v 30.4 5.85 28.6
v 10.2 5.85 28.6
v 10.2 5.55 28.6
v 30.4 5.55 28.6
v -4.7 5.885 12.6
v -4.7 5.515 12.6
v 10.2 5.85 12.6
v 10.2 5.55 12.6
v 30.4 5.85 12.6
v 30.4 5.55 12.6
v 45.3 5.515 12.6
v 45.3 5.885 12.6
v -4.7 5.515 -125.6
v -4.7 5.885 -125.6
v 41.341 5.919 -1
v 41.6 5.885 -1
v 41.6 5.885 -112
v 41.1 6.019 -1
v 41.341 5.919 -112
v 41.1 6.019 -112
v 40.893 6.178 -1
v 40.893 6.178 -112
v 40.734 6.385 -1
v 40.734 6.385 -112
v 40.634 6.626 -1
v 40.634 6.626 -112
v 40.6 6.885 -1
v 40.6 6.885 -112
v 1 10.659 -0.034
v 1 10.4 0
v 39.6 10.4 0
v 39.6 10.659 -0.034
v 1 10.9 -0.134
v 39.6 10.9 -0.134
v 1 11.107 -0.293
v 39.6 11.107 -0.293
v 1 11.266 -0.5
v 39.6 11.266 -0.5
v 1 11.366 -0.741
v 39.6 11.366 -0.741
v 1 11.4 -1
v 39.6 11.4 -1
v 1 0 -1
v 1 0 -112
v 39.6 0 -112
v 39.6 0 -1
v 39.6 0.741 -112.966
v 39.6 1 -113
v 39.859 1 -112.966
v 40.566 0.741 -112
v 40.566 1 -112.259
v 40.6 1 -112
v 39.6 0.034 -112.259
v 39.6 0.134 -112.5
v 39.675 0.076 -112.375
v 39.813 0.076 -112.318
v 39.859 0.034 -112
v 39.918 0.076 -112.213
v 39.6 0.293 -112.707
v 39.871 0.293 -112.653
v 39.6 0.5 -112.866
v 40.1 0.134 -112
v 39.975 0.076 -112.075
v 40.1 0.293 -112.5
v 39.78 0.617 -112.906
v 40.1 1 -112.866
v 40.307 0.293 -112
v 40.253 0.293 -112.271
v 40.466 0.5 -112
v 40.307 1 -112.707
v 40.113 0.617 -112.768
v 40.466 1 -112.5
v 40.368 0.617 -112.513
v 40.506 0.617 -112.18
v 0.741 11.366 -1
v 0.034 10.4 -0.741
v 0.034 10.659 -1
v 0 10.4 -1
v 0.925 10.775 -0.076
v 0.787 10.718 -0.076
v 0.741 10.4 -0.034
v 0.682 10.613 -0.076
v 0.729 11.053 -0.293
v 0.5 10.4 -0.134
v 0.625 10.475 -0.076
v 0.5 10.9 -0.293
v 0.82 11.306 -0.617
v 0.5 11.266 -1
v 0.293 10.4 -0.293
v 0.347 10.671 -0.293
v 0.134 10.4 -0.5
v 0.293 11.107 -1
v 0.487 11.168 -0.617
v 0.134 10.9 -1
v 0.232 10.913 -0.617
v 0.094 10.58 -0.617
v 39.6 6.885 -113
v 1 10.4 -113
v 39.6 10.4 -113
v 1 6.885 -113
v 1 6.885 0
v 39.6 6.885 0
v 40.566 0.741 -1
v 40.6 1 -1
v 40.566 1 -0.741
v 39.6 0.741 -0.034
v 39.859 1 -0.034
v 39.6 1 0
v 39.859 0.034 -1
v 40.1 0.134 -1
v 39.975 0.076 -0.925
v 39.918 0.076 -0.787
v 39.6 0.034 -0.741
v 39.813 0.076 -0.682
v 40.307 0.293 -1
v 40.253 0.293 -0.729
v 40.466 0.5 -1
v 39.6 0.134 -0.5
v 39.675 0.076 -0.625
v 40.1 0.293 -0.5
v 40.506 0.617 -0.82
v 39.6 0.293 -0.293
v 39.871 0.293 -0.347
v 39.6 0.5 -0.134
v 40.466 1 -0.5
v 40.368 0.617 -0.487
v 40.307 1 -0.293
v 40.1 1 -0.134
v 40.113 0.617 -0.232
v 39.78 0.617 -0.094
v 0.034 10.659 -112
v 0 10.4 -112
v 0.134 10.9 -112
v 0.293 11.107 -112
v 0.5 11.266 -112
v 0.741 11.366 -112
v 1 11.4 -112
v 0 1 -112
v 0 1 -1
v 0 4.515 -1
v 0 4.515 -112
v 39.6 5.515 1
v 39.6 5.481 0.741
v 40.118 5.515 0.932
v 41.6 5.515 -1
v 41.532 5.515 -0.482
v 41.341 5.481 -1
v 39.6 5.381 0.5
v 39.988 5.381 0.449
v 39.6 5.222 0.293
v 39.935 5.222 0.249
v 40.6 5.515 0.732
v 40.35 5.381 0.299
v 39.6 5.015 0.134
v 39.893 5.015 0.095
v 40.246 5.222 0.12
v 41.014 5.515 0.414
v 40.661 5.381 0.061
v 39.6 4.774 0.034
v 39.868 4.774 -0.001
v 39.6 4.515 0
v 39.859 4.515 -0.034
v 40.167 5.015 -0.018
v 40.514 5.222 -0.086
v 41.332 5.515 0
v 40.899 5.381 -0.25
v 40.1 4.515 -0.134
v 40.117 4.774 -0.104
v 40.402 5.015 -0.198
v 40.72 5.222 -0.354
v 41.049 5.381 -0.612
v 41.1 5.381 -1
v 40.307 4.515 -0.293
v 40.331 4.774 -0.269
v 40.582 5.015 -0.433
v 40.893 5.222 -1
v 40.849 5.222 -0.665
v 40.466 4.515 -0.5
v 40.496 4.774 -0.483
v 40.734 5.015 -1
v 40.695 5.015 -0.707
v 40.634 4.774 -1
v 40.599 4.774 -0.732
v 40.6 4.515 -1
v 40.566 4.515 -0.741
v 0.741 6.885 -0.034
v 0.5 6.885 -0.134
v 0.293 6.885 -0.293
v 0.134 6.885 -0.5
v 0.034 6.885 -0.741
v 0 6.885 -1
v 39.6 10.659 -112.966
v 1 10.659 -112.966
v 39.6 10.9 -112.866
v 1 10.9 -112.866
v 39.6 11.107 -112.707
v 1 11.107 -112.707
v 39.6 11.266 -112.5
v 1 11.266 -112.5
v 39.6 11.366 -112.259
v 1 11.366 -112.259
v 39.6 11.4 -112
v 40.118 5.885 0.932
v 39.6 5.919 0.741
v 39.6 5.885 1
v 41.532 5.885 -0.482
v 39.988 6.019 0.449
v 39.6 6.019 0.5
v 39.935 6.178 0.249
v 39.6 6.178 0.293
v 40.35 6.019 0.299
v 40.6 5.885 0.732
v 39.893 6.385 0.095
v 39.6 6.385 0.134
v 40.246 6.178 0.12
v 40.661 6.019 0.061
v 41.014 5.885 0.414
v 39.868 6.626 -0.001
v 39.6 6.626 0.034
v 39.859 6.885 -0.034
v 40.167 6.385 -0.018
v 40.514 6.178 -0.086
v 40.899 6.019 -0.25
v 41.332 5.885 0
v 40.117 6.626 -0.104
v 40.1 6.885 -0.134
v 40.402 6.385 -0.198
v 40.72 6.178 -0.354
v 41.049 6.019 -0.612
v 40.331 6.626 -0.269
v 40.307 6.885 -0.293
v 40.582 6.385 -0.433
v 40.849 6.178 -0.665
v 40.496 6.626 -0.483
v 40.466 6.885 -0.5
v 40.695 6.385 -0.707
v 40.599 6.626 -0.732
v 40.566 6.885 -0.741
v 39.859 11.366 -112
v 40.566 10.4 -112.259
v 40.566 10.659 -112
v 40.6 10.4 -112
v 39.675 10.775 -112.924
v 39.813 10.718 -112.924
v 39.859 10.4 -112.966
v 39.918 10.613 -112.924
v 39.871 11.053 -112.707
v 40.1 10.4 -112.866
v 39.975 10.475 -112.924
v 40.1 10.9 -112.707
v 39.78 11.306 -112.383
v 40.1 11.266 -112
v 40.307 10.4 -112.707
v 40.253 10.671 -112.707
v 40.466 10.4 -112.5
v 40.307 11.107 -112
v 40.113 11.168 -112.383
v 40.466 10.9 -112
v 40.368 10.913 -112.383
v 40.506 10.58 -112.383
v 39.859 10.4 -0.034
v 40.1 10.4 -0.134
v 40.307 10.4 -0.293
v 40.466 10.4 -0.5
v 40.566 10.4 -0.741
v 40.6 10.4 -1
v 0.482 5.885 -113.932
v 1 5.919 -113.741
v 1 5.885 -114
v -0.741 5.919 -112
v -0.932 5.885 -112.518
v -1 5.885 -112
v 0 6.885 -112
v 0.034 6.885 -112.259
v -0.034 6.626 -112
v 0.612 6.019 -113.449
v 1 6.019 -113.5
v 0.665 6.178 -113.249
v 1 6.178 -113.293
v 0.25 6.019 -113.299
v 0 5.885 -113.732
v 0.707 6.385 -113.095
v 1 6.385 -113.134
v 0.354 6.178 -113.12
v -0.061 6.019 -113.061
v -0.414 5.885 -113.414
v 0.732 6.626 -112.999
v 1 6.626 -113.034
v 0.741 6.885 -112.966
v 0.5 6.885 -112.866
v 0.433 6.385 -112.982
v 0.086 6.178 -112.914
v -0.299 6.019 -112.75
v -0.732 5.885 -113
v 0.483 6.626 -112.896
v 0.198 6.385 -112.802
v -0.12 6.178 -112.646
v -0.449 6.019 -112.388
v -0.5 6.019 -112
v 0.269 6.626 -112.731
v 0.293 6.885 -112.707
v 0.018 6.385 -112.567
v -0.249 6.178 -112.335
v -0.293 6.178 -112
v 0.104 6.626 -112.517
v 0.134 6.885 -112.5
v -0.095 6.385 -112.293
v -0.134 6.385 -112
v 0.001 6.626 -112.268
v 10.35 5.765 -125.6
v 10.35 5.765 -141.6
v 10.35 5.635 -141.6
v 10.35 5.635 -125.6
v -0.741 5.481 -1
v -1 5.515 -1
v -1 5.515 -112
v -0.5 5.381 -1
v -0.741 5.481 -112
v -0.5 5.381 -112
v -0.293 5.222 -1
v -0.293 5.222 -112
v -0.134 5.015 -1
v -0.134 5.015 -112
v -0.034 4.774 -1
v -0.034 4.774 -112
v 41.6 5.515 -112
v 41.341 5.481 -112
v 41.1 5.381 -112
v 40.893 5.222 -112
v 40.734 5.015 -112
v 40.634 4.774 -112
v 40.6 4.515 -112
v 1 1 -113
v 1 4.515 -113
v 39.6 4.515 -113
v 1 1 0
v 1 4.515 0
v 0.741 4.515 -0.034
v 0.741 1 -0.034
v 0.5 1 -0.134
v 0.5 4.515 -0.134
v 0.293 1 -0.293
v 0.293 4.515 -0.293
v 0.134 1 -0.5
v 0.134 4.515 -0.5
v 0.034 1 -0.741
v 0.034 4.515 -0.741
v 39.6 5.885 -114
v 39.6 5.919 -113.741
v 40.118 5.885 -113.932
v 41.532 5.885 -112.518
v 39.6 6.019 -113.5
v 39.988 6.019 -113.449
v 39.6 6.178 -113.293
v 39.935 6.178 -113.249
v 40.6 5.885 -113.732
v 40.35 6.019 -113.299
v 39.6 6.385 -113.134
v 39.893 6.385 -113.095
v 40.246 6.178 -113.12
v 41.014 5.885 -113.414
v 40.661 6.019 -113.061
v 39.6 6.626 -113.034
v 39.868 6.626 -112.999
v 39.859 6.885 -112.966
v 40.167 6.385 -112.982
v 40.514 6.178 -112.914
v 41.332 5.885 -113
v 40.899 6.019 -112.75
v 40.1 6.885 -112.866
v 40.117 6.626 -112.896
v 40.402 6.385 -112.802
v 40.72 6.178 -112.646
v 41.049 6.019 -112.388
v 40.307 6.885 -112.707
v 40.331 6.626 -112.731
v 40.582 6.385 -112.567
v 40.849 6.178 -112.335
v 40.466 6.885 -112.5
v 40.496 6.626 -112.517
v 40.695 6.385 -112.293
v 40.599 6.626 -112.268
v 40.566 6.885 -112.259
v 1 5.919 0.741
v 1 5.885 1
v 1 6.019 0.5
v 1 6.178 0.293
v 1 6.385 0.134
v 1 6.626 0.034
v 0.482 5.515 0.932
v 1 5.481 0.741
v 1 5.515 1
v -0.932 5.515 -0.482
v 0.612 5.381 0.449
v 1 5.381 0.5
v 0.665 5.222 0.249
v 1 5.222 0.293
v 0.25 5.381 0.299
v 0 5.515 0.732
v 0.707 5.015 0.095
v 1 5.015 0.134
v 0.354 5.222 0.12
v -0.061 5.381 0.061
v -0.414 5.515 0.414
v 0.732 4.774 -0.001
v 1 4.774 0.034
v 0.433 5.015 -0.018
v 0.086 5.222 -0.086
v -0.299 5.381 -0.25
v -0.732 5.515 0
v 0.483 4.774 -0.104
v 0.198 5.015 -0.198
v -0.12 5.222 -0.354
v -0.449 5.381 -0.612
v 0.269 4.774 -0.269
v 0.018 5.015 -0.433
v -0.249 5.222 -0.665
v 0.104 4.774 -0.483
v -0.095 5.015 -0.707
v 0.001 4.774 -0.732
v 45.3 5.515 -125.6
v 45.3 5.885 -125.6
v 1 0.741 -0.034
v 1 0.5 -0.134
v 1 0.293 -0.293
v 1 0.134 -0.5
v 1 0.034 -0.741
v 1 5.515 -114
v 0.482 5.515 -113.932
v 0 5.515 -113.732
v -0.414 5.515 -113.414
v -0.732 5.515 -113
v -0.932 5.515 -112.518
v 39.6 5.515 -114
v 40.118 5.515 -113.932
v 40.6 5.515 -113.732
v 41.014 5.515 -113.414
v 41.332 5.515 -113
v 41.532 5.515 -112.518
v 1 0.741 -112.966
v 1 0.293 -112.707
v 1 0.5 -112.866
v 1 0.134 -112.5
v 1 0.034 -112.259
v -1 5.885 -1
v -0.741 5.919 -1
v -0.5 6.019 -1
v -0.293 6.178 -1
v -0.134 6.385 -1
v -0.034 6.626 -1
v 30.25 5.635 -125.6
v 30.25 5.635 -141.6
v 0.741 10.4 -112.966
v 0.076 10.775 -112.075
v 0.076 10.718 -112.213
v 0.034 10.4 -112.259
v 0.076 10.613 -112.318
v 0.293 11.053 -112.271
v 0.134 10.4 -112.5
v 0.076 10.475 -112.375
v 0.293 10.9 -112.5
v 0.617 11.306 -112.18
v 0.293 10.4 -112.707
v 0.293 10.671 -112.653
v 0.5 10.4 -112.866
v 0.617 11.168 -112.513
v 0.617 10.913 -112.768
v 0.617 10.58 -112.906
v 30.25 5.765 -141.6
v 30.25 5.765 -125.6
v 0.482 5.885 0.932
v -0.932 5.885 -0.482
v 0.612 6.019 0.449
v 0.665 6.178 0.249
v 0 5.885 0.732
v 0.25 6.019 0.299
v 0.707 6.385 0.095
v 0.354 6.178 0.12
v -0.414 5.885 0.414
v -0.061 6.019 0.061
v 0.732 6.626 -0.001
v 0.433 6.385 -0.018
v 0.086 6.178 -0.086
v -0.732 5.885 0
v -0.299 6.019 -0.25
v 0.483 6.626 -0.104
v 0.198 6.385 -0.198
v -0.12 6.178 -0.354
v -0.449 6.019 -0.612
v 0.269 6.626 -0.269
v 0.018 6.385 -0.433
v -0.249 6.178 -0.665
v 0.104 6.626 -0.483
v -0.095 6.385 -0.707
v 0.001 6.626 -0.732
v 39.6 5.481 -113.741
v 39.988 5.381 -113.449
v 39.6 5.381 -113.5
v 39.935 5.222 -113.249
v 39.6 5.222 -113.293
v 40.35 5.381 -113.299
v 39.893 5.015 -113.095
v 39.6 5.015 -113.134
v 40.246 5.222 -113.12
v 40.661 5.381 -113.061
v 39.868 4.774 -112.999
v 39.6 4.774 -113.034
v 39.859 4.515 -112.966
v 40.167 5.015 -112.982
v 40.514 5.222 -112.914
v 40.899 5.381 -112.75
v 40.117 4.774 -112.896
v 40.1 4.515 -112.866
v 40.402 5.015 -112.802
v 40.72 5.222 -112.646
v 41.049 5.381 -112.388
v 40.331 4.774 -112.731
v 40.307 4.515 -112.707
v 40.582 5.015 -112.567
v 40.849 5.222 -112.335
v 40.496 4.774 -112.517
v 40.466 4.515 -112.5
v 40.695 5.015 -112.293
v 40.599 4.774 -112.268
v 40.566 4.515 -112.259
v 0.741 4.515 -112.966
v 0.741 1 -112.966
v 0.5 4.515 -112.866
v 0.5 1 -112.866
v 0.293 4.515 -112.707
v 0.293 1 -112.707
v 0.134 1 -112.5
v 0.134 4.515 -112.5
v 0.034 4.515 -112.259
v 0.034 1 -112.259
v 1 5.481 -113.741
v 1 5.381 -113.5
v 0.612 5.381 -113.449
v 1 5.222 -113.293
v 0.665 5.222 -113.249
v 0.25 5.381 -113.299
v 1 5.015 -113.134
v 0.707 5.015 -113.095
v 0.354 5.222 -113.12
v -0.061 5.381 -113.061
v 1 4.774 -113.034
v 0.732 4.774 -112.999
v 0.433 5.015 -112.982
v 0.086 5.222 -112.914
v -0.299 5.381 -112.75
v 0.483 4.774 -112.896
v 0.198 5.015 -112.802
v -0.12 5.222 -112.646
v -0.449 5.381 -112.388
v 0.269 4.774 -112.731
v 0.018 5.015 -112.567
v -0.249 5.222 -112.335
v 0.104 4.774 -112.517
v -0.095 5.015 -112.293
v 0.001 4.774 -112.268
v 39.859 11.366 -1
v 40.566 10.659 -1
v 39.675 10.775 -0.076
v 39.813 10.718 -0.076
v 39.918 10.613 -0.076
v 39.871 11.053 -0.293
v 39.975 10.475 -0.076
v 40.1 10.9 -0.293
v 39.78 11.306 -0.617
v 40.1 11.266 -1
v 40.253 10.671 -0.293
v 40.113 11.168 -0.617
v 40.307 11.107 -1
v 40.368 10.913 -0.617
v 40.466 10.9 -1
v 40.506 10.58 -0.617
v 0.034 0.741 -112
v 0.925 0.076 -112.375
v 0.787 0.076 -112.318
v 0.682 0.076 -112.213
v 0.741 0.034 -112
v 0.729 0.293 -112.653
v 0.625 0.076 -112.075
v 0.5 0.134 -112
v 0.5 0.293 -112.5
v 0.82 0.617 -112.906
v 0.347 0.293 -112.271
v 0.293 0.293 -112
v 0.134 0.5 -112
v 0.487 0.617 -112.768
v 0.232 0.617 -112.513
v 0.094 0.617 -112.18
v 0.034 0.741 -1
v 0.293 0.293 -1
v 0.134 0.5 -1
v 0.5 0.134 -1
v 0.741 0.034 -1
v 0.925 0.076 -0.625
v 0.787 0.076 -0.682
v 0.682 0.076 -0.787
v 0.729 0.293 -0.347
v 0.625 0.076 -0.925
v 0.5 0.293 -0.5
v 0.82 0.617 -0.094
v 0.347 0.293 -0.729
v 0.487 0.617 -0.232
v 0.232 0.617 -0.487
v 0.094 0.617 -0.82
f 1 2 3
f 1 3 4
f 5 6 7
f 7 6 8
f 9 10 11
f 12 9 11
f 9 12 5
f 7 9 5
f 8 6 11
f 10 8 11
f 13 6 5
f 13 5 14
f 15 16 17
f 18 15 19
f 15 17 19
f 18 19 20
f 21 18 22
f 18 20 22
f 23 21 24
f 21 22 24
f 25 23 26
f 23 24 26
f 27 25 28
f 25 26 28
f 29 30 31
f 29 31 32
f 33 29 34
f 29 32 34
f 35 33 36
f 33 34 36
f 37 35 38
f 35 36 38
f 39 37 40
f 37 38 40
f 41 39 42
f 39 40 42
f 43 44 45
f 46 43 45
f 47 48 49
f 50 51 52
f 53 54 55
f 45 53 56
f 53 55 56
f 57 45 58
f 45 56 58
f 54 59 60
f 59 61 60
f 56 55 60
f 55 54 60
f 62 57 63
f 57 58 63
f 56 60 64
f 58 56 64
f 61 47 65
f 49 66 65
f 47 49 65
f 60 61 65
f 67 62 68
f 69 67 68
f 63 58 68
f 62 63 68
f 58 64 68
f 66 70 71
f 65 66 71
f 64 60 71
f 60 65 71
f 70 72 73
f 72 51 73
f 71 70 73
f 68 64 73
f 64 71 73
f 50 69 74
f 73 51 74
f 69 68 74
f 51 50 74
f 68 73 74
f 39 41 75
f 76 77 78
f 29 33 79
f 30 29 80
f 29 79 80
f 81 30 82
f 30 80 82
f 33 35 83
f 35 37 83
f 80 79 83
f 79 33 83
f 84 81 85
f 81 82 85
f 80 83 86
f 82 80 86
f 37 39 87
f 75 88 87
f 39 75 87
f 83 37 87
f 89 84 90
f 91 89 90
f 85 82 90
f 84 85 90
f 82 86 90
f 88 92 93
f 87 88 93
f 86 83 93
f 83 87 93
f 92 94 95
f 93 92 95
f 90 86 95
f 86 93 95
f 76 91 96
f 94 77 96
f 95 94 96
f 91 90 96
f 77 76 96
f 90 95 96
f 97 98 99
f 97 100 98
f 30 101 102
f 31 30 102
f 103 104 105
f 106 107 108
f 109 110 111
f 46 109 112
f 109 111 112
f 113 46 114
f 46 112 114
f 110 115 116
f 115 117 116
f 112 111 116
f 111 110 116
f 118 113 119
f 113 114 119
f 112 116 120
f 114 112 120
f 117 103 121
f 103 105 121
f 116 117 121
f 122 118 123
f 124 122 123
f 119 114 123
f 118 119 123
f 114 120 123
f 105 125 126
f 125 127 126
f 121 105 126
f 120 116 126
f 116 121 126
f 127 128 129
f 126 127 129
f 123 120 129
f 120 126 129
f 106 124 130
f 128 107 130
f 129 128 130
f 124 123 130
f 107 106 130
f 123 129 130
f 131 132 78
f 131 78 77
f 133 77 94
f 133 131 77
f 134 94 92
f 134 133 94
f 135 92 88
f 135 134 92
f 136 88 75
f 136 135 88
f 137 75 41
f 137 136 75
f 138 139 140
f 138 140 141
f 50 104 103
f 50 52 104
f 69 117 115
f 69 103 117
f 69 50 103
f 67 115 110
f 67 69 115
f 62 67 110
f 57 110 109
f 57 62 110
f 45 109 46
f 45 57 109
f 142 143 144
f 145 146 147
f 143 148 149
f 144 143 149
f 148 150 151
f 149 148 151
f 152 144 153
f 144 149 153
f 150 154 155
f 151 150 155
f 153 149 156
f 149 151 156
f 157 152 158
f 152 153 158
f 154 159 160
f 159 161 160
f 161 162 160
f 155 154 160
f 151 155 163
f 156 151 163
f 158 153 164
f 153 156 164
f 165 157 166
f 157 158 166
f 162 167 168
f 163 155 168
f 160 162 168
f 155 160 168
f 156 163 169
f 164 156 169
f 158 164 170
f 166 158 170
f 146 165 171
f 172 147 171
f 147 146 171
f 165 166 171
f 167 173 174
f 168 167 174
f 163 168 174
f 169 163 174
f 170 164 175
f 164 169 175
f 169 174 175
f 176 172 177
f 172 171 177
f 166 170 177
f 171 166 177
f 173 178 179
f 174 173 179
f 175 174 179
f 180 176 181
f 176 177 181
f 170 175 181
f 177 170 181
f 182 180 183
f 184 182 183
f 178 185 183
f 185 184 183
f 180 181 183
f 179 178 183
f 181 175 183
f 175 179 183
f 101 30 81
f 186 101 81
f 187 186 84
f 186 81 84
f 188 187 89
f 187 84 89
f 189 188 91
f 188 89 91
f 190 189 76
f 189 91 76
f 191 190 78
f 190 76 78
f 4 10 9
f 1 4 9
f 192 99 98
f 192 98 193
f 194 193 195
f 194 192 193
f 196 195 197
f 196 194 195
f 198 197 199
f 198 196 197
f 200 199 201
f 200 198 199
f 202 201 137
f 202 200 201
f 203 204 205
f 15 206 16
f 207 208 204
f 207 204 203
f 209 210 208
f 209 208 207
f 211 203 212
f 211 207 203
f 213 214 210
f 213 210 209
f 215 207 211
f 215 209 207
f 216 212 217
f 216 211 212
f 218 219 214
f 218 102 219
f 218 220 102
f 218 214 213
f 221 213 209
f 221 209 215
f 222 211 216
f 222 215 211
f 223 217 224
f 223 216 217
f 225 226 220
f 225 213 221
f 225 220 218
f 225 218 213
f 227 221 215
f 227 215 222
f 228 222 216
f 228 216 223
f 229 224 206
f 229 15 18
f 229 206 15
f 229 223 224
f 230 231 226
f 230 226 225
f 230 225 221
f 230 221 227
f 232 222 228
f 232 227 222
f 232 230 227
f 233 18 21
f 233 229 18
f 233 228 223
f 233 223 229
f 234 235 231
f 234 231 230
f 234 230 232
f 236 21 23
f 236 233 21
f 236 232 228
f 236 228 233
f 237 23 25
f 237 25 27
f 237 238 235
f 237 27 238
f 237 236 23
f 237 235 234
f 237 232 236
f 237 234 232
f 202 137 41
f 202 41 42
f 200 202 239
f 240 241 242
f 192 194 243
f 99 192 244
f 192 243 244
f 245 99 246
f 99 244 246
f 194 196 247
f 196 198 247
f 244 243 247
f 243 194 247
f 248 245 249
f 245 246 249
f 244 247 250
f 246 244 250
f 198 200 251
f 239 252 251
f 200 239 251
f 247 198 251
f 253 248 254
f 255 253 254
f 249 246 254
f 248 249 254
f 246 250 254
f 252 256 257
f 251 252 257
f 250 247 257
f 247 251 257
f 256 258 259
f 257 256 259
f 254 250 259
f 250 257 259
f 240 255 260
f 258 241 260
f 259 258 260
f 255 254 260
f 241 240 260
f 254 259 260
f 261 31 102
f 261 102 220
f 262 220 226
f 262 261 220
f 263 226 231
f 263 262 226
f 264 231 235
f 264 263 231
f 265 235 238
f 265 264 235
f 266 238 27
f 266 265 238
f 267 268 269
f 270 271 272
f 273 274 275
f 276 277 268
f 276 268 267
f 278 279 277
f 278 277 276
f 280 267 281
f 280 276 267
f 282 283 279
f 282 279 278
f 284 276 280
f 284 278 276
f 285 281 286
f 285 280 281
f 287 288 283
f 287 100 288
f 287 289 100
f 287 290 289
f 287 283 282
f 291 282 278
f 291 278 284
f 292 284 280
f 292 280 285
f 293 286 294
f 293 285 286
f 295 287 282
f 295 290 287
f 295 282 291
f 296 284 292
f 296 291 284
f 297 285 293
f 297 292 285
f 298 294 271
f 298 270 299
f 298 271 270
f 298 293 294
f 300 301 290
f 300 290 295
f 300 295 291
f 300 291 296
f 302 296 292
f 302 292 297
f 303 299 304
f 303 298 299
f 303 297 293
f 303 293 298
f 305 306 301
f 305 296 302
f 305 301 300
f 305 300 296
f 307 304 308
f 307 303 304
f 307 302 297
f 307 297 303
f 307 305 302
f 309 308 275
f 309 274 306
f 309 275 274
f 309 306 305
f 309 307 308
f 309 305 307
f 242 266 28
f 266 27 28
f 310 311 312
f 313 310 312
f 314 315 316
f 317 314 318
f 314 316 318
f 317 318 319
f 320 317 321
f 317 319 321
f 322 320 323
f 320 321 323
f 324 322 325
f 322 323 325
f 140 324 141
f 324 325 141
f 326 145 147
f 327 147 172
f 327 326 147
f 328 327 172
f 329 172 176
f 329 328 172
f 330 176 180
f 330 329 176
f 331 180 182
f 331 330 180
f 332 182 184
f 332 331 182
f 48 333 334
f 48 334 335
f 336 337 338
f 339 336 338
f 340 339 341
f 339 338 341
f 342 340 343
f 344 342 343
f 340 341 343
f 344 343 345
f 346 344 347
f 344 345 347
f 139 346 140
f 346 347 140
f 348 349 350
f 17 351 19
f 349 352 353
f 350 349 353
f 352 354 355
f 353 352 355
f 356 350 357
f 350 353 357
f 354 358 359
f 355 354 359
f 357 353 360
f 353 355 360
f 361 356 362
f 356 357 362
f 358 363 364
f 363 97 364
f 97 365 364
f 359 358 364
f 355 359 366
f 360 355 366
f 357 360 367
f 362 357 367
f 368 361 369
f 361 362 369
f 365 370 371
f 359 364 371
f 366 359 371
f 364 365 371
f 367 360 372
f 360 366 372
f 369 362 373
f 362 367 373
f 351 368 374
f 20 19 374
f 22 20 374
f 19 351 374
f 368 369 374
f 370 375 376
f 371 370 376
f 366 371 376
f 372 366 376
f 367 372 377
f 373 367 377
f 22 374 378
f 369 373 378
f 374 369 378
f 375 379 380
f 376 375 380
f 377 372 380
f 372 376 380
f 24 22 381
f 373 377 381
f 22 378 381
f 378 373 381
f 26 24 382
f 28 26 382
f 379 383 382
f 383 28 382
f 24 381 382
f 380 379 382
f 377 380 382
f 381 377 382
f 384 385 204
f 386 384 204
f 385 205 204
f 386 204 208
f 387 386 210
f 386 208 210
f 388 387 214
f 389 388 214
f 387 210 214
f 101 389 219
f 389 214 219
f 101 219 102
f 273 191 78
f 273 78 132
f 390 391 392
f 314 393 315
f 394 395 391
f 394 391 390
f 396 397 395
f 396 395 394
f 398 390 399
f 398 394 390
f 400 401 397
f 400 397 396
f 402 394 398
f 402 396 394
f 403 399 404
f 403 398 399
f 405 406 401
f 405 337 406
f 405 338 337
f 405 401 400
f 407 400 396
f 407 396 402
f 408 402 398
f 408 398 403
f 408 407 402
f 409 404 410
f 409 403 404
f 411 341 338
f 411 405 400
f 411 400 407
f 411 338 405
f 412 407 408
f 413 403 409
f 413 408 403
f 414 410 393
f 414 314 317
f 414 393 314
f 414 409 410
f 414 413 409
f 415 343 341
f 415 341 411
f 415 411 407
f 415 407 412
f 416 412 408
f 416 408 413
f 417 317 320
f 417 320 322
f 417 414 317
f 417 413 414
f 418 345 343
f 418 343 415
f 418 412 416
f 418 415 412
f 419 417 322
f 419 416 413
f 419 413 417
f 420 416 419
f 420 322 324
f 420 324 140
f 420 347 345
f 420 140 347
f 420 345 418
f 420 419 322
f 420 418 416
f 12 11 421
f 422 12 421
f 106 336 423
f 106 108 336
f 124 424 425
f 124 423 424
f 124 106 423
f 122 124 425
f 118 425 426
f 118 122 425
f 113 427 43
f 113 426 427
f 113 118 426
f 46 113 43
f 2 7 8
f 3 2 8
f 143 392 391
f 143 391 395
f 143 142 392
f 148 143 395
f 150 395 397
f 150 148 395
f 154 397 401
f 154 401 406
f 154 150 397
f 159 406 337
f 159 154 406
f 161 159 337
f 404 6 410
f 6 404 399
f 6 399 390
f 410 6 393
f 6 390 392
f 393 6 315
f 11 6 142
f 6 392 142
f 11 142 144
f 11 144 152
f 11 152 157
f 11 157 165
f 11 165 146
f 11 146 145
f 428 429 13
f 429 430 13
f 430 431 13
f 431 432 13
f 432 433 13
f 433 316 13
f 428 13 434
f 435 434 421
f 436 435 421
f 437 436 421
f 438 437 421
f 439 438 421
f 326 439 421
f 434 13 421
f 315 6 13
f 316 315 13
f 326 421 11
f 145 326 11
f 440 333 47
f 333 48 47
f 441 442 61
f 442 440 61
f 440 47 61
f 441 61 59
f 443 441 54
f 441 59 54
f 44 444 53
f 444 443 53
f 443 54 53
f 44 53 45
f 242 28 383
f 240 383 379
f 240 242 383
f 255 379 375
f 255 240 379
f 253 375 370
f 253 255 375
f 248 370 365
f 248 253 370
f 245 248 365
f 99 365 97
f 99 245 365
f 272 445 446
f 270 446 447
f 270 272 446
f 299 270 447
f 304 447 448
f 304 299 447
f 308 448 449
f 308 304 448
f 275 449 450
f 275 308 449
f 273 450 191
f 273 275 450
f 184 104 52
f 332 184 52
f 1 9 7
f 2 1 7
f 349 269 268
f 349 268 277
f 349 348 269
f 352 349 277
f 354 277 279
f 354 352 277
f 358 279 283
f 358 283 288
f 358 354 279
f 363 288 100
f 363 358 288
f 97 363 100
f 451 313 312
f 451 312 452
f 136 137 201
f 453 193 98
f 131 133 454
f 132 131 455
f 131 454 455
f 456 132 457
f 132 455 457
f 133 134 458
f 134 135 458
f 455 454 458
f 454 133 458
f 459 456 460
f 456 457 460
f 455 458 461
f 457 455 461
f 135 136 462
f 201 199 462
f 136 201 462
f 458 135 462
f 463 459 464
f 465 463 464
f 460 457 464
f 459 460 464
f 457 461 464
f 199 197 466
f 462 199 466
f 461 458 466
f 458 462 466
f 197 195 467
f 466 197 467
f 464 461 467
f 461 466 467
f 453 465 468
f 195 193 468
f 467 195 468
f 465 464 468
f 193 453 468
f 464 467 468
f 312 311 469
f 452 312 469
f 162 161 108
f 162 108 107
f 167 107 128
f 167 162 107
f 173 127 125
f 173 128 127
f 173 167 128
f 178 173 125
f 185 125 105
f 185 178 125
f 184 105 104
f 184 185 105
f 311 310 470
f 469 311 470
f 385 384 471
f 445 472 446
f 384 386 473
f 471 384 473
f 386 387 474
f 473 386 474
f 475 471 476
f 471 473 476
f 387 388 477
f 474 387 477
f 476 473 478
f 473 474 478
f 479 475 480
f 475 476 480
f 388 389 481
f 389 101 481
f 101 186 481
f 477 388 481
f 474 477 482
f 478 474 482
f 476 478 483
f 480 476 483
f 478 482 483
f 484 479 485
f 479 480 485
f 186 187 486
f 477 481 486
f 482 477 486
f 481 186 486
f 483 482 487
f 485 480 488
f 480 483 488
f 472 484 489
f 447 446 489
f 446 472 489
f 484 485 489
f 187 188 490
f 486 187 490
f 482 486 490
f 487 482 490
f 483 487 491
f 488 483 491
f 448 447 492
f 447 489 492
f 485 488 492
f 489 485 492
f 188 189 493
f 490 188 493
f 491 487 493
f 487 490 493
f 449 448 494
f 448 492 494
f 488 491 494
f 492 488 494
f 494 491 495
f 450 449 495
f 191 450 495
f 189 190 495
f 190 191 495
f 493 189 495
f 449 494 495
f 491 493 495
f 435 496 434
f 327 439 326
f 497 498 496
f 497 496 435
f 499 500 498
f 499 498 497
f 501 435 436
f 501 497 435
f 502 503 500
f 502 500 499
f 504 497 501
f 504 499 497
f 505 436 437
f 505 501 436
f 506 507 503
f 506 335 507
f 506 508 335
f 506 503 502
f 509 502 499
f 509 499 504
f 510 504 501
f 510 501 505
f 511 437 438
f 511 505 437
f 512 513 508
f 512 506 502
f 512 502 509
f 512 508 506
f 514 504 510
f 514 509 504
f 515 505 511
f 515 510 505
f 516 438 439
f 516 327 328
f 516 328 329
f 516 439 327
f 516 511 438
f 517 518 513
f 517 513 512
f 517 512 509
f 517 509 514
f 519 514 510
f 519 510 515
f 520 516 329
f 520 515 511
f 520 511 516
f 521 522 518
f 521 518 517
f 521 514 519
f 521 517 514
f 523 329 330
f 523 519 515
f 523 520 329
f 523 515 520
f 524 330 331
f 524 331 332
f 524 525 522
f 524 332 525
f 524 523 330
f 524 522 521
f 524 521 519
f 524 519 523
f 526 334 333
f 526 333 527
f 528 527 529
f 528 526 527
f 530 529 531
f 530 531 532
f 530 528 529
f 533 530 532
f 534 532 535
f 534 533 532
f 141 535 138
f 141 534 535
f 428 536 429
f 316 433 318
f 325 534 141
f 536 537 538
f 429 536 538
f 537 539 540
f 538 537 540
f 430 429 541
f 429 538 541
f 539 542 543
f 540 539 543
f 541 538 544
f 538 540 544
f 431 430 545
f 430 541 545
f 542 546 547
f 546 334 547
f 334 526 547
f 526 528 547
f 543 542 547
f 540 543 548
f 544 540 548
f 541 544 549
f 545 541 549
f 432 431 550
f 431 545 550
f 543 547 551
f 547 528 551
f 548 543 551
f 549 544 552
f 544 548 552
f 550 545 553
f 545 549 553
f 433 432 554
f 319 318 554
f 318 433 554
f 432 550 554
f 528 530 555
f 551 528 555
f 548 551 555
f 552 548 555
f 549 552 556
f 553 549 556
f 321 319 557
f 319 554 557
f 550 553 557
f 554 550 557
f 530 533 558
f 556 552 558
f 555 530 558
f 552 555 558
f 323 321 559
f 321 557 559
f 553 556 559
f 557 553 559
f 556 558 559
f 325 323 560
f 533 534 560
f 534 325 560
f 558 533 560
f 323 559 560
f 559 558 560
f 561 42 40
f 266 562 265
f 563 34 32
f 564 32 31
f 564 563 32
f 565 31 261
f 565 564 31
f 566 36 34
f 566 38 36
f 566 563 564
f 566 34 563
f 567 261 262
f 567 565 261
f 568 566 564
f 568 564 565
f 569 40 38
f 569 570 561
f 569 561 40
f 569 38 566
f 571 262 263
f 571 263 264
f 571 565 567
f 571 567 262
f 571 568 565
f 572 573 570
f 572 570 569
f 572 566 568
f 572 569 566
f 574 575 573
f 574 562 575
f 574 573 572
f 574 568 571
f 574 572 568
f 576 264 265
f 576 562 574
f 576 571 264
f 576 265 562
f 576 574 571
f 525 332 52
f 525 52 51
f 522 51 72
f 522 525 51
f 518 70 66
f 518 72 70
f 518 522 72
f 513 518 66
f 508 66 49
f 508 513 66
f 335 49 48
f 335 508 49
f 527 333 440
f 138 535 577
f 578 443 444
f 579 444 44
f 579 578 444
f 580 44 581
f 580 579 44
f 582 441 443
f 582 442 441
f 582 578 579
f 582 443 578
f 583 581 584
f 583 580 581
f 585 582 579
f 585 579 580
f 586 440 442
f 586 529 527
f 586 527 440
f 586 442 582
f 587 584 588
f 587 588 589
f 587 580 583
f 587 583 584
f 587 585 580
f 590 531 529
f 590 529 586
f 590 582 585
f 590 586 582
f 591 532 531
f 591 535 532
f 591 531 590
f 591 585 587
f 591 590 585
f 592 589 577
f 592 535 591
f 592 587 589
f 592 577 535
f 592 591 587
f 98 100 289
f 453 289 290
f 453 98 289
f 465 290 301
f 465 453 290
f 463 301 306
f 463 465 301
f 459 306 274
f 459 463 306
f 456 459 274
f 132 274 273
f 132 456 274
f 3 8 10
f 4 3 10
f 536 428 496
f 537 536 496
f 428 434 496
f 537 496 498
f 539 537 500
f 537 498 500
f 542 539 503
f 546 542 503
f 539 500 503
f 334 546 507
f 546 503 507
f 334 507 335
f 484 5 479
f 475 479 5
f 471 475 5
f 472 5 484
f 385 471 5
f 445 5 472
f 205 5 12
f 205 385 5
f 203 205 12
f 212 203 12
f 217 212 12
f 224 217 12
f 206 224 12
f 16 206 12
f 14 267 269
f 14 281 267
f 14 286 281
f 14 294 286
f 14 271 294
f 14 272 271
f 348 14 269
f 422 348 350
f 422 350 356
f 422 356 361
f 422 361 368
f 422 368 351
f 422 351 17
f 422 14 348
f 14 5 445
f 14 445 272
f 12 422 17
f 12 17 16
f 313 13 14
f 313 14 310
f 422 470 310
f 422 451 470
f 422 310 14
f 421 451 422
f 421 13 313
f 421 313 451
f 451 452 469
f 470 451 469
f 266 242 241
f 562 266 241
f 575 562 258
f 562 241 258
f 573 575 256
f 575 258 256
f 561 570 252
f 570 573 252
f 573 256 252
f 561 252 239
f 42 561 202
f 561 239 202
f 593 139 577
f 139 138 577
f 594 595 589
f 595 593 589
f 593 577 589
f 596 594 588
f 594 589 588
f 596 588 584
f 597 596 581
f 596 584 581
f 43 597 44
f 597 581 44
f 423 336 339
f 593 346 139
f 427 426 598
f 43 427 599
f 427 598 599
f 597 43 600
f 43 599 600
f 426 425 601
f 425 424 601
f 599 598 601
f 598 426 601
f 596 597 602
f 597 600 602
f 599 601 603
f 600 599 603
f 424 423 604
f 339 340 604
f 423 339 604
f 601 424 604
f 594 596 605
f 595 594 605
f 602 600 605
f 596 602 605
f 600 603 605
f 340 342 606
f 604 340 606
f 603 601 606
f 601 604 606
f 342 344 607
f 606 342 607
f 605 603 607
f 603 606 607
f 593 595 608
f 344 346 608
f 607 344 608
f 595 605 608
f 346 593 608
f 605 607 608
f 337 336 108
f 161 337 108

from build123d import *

# Parameters (mm, degrees)
SKETCH1_W                = 40.6
SKETCH1_H                = 113
BOSS_EXTRUDE2_DEPTH      = 11.4
SKETCH3_W                = 4.7
SKETCH3_H                = 0.01
BOSS_EXTRUDE3_DEPTH      = 1
BOSS_EXTRUDE4_DEPTH      = 0.185
BOSS_EXTRUDE4_DEPTH_BACK = 0.185
SKETCH4_W                = 50
SKETCH4_H                = 138.2
BOSS_EXTRUDE5_DEPTH      = 16
BOSS_EXTRUDE6_DEPTH      = 16
FILLET1_R                = 1


with BuildPart() as part:
    # Sketch1 → Boss-Extrude2 (new body)
    with BuildSketch(Plane(origin=(0, 0, 0), x_dir=(1, 0, 0), z_dir=(0, 1, 0))):
        with Locations((20.3, 56.5)):
            Rectangle(SKETCH1_W, SKETCH1_H)
    extrude(amount=BOSS_EXTRUDE2_DEPTH)



with BuildPart() as body_2:
    # Sketch3 → Boss-Extrude3 (new body)
    with BuildSketch(Plane.XY):
        with Locations((-2.35, 5.695)):
            Rectangle(SKETCH3_W, SKETCH3_H)
    extrude(amount=BOSS_EXTRUDE3_DEPTH)


with BuildPart() as part_1:
    add(part.part)

    add(body_2.part)  # Boss-Extrude4 merges body 2
    # Sketch4 → Boss-Extrude4 (add, two sides: drawn at the far end of the back side and taken through both)
    with BuildSketch(Plane(origin=(0, 5.7, 0), x_dir=(1, 0, 0), z_dir=(0, 1, 0)).offset(-BOSS_EXTRUDE4_DEPTH_BACK)):
        with Locations((20.3, 56.5)):
            Rectangle(SKETCH4_W, SKETCH4_H)
    extrude(amount=BOSS_EXTRUDE4_DEPTH + BOSS_EXTRUDE4_DEPTH_BACK)

    # Sketch5 → Boss-Extrude5 (add)
    with BuildSketch(Plane.XY.offset(12.6)):
        Polygon((30.4, 5.85), (20.3, 5.85), (10.2, 5.85), (10.2, 5.549950483), (30.4, 5.549950483), align=None)
    extrude(amount=BOSS_EXTRUDE5_DEPTH)

    # Sketch6 → Boss-Extrude6 (add)
    with BuildSketch(Plane(origin=(0, 0, -125.6), x_dir=(-1, 0, 0), z_dir=(0, 0, -1))):
        Polygon((-20.3, 5.765), (-10.35, 5.765), (-10.35, 5.635), (-30.25, 5.635), (-30.25, 5.765), align=None)
    extrude(amount=BOSS_EXTRUDE6_DEPTH)

    # Fillet1
    fillet1_edges = [part_1.edges().sort_by_distance(p)[0] for p in [
        (40.6, 11.4, -56.5),
        (20.3, 11.4, -113),
        (0, 2.7575, -113),
        (40.6, 2.7575, -113),
        (20.3, 5.885, -113),
        (20.3, 5.515, -113),
        (40.6, 2.7575, 0),
        (0, 2.7575, 0),
        (20.3, 5.885, 0),
        (0, 5.885, -56.5),
        (40.6, 5.885, -56.5),
        (20.3, 5.515, 0),
        (0, 5.515, -56.5),
        (40.6, 5.515, -56.5),
        (0, 11.4, -56.5),
        (20.3, 0, -113),
        (40.6, 0, -56.5),
        (20.3, 0, 0),
        (0, 0, -56.5),
        (20.3, 11.4, 0),
        (0, 8.6425, -113),
        (40.6, 8.6425, -113),
        (40.6, 8.6425, 0),
        (0, 8.6425, 0),
    ]]
    fillet(fillet1_edges, radius=FILLET1_R)


solid = part_1.part
